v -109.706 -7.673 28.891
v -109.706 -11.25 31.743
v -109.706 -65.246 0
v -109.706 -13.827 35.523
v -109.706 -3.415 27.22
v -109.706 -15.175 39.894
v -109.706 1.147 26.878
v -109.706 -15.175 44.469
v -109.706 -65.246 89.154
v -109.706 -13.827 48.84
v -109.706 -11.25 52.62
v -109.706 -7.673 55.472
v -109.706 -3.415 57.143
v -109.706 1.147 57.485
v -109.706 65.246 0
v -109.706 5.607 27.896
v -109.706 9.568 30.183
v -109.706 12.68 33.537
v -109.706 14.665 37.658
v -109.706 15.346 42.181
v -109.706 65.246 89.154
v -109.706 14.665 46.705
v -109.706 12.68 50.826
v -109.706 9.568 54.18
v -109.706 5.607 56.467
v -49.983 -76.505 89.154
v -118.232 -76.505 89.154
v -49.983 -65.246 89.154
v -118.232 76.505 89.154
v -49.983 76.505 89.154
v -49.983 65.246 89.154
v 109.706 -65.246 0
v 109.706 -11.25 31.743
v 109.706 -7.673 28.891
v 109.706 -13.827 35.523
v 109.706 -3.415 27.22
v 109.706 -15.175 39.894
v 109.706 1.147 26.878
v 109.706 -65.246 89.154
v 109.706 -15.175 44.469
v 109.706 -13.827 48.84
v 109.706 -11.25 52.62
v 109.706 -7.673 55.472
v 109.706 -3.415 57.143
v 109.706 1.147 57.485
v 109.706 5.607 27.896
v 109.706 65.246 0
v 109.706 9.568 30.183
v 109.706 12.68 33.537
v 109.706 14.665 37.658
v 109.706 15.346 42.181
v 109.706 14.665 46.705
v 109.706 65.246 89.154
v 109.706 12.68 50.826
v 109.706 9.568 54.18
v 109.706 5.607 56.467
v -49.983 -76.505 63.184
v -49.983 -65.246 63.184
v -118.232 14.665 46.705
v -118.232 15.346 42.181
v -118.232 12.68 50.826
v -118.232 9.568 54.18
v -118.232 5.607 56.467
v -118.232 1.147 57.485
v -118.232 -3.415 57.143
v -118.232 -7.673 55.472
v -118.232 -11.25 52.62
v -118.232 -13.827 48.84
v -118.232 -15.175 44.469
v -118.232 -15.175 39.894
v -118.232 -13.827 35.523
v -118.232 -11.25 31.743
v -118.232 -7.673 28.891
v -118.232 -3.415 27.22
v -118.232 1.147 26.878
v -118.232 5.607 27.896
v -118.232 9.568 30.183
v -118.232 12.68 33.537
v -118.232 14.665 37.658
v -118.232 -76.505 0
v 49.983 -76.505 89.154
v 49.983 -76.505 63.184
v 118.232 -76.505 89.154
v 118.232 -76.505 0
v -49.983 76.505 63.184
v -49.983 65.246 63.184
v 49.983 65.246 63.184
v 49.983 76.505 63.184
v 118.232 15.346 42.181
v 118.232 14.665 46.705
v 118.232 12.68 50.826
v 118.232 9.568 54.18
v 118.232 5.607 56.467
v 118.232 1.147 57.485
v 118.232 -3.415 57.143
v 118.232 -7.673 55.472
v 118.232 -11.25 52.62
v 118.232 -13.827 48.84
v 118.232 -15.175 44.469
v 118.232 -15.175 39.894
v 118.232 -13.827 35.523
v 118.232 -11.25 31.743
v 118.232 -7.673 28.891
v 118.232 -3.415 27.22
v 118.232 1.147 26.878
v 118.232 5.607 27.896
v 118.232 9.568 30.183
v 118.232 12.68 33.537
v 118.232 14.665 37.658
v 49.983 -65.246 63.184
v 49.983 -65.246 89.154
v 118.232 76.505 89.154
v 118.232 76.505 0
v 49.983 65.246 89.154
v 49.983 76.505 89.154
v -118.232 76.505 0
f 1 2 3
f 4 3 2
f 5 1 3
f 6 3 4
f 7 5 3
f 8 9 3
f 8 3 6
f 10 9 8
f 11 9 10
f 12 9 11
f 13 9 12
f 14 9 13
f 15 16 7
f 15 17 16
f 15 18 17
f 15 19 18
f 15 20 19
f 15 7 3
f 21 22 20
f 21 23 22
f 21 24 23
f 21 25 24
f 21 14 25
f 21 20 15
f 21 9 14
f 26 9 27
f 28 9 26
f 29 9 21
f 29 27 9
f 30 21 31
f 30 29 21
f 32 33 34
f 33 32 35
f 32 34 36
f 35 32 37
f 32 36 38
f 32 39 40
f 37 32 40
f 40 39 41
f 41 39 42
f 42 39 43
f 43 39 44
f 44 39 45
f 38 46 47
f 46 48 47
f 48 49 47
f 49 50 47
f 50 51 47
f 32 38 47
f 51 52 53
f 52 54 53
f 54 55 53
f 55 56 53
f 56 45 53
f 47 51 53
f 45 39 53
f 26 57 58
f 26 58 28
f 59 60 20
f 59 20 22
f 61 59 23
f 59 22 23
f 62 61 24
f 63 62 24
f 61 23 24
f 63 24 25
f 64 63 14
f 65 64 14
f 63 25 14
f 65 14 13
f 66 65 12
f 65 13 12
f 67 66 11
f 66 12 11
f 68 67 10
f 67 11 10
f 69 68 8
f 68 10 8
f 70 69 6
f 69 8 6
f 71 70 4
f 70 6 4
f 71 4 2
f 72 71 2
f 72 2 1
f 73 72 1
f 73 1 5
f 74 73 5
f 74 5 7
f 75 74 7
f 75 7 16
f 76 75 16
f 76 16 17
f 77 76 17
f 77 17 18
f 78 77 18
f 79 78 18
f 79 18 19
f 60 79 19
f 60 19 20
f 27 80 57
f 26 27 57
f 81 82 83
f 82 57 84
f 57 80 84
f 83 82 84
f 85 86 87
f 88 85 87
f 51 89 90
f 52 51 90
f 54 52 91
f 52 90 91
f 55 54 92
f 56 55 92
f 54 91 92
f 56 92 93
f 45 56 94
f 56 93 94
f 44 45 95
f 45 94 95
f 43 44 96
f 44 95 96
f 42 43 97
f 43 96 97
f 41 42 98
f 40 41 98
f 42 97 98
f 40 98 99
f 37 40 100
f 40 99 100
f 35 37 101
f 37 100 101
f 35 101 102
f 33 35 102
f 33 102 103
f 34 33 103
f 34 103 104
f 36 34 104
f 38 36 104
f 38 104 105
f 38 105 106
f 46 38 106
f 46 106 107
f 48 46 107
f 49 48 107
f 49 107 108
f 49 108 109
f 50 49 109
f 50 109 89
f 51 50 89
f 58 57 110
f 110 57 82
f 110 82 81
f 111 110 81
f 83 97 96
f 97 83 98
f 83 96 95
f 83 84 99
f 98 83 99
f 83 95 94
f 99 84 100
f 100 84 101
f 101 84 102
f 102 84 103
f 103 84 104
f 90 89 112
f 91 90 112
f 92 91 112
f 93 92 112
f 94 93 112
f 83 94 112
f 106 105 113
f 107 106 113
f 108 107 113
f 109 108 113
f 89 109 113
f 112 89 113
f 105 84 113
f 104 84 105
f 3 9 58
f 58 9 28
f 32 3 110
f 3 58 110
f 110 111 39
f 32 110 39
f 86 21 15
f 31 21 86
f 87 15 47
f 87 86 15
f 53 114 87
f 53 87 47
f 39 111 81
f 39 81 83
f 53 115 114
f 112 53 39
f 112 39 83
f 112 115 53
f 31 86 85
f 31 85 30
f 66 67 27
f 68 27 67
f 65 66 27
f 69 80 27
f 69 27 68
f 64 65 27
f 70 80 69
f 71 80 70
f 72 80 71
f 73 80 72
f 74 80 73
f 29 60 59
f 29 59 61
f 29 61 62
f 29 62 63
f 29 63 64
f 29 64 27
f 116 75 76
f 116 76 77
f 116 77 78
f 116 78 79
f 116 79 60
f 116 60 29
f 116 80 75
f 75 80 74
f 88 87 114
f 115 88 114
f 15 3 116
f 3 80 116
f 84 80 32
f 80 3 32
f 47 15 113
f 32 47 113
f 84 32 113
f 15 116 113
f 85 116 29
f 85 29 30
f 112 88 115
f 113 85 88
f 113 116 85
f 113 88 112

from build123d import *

# Parameters (mm, degrees)
F0_W     = 236.464172
F0_H     = 153.010204
F1_DEPTH = 89.154
F2_W     = 219.41261
F2_H     = 130.49218
F3_DEPTH = 170.434
F4_W     = 99.966138
F4_H     = 51.93973
F5_DEPTH = 169.926
F6_R     = 15.346297
F7_DEPTH = 355.854


with BuildPart() as f1:
    # F0 (on Top) → F1 (new body)
    with BuildSketch(Plane.XY):
        Rectangle(F0_W, F0_H)
    extrude(amount=F1_DEPTH)

    # F2 (on face) → F3 (cut)
    with BuildSketch(Plane.XY.offset(89.154)):
        Rectangle(F2_W, F2_H)
    extrude(amount=-F3_DEPTH, mode=Mode.SUBTRACT)

    # F4 (on face) → F5 (cut)
    with BuildSketch(Plane.XZ.offset(76.505102)):
        with Locations((0, 89.154)):
            Rectangle(F4_W, F4_H)
    extrude(amount=-F5_DEPTH, mode=Mode.SUBTRACT)

    # F6 (on face) → F7 (cut)
    with BuildSketch(Plane.YZ.offset(118.232086)):
        with Locations((0, 42.181458)):
            Circle(F6_R)
    extrude(amount=-F7_DEPTH, mode=Mode.SUBTRACT)


solid = f1.part
